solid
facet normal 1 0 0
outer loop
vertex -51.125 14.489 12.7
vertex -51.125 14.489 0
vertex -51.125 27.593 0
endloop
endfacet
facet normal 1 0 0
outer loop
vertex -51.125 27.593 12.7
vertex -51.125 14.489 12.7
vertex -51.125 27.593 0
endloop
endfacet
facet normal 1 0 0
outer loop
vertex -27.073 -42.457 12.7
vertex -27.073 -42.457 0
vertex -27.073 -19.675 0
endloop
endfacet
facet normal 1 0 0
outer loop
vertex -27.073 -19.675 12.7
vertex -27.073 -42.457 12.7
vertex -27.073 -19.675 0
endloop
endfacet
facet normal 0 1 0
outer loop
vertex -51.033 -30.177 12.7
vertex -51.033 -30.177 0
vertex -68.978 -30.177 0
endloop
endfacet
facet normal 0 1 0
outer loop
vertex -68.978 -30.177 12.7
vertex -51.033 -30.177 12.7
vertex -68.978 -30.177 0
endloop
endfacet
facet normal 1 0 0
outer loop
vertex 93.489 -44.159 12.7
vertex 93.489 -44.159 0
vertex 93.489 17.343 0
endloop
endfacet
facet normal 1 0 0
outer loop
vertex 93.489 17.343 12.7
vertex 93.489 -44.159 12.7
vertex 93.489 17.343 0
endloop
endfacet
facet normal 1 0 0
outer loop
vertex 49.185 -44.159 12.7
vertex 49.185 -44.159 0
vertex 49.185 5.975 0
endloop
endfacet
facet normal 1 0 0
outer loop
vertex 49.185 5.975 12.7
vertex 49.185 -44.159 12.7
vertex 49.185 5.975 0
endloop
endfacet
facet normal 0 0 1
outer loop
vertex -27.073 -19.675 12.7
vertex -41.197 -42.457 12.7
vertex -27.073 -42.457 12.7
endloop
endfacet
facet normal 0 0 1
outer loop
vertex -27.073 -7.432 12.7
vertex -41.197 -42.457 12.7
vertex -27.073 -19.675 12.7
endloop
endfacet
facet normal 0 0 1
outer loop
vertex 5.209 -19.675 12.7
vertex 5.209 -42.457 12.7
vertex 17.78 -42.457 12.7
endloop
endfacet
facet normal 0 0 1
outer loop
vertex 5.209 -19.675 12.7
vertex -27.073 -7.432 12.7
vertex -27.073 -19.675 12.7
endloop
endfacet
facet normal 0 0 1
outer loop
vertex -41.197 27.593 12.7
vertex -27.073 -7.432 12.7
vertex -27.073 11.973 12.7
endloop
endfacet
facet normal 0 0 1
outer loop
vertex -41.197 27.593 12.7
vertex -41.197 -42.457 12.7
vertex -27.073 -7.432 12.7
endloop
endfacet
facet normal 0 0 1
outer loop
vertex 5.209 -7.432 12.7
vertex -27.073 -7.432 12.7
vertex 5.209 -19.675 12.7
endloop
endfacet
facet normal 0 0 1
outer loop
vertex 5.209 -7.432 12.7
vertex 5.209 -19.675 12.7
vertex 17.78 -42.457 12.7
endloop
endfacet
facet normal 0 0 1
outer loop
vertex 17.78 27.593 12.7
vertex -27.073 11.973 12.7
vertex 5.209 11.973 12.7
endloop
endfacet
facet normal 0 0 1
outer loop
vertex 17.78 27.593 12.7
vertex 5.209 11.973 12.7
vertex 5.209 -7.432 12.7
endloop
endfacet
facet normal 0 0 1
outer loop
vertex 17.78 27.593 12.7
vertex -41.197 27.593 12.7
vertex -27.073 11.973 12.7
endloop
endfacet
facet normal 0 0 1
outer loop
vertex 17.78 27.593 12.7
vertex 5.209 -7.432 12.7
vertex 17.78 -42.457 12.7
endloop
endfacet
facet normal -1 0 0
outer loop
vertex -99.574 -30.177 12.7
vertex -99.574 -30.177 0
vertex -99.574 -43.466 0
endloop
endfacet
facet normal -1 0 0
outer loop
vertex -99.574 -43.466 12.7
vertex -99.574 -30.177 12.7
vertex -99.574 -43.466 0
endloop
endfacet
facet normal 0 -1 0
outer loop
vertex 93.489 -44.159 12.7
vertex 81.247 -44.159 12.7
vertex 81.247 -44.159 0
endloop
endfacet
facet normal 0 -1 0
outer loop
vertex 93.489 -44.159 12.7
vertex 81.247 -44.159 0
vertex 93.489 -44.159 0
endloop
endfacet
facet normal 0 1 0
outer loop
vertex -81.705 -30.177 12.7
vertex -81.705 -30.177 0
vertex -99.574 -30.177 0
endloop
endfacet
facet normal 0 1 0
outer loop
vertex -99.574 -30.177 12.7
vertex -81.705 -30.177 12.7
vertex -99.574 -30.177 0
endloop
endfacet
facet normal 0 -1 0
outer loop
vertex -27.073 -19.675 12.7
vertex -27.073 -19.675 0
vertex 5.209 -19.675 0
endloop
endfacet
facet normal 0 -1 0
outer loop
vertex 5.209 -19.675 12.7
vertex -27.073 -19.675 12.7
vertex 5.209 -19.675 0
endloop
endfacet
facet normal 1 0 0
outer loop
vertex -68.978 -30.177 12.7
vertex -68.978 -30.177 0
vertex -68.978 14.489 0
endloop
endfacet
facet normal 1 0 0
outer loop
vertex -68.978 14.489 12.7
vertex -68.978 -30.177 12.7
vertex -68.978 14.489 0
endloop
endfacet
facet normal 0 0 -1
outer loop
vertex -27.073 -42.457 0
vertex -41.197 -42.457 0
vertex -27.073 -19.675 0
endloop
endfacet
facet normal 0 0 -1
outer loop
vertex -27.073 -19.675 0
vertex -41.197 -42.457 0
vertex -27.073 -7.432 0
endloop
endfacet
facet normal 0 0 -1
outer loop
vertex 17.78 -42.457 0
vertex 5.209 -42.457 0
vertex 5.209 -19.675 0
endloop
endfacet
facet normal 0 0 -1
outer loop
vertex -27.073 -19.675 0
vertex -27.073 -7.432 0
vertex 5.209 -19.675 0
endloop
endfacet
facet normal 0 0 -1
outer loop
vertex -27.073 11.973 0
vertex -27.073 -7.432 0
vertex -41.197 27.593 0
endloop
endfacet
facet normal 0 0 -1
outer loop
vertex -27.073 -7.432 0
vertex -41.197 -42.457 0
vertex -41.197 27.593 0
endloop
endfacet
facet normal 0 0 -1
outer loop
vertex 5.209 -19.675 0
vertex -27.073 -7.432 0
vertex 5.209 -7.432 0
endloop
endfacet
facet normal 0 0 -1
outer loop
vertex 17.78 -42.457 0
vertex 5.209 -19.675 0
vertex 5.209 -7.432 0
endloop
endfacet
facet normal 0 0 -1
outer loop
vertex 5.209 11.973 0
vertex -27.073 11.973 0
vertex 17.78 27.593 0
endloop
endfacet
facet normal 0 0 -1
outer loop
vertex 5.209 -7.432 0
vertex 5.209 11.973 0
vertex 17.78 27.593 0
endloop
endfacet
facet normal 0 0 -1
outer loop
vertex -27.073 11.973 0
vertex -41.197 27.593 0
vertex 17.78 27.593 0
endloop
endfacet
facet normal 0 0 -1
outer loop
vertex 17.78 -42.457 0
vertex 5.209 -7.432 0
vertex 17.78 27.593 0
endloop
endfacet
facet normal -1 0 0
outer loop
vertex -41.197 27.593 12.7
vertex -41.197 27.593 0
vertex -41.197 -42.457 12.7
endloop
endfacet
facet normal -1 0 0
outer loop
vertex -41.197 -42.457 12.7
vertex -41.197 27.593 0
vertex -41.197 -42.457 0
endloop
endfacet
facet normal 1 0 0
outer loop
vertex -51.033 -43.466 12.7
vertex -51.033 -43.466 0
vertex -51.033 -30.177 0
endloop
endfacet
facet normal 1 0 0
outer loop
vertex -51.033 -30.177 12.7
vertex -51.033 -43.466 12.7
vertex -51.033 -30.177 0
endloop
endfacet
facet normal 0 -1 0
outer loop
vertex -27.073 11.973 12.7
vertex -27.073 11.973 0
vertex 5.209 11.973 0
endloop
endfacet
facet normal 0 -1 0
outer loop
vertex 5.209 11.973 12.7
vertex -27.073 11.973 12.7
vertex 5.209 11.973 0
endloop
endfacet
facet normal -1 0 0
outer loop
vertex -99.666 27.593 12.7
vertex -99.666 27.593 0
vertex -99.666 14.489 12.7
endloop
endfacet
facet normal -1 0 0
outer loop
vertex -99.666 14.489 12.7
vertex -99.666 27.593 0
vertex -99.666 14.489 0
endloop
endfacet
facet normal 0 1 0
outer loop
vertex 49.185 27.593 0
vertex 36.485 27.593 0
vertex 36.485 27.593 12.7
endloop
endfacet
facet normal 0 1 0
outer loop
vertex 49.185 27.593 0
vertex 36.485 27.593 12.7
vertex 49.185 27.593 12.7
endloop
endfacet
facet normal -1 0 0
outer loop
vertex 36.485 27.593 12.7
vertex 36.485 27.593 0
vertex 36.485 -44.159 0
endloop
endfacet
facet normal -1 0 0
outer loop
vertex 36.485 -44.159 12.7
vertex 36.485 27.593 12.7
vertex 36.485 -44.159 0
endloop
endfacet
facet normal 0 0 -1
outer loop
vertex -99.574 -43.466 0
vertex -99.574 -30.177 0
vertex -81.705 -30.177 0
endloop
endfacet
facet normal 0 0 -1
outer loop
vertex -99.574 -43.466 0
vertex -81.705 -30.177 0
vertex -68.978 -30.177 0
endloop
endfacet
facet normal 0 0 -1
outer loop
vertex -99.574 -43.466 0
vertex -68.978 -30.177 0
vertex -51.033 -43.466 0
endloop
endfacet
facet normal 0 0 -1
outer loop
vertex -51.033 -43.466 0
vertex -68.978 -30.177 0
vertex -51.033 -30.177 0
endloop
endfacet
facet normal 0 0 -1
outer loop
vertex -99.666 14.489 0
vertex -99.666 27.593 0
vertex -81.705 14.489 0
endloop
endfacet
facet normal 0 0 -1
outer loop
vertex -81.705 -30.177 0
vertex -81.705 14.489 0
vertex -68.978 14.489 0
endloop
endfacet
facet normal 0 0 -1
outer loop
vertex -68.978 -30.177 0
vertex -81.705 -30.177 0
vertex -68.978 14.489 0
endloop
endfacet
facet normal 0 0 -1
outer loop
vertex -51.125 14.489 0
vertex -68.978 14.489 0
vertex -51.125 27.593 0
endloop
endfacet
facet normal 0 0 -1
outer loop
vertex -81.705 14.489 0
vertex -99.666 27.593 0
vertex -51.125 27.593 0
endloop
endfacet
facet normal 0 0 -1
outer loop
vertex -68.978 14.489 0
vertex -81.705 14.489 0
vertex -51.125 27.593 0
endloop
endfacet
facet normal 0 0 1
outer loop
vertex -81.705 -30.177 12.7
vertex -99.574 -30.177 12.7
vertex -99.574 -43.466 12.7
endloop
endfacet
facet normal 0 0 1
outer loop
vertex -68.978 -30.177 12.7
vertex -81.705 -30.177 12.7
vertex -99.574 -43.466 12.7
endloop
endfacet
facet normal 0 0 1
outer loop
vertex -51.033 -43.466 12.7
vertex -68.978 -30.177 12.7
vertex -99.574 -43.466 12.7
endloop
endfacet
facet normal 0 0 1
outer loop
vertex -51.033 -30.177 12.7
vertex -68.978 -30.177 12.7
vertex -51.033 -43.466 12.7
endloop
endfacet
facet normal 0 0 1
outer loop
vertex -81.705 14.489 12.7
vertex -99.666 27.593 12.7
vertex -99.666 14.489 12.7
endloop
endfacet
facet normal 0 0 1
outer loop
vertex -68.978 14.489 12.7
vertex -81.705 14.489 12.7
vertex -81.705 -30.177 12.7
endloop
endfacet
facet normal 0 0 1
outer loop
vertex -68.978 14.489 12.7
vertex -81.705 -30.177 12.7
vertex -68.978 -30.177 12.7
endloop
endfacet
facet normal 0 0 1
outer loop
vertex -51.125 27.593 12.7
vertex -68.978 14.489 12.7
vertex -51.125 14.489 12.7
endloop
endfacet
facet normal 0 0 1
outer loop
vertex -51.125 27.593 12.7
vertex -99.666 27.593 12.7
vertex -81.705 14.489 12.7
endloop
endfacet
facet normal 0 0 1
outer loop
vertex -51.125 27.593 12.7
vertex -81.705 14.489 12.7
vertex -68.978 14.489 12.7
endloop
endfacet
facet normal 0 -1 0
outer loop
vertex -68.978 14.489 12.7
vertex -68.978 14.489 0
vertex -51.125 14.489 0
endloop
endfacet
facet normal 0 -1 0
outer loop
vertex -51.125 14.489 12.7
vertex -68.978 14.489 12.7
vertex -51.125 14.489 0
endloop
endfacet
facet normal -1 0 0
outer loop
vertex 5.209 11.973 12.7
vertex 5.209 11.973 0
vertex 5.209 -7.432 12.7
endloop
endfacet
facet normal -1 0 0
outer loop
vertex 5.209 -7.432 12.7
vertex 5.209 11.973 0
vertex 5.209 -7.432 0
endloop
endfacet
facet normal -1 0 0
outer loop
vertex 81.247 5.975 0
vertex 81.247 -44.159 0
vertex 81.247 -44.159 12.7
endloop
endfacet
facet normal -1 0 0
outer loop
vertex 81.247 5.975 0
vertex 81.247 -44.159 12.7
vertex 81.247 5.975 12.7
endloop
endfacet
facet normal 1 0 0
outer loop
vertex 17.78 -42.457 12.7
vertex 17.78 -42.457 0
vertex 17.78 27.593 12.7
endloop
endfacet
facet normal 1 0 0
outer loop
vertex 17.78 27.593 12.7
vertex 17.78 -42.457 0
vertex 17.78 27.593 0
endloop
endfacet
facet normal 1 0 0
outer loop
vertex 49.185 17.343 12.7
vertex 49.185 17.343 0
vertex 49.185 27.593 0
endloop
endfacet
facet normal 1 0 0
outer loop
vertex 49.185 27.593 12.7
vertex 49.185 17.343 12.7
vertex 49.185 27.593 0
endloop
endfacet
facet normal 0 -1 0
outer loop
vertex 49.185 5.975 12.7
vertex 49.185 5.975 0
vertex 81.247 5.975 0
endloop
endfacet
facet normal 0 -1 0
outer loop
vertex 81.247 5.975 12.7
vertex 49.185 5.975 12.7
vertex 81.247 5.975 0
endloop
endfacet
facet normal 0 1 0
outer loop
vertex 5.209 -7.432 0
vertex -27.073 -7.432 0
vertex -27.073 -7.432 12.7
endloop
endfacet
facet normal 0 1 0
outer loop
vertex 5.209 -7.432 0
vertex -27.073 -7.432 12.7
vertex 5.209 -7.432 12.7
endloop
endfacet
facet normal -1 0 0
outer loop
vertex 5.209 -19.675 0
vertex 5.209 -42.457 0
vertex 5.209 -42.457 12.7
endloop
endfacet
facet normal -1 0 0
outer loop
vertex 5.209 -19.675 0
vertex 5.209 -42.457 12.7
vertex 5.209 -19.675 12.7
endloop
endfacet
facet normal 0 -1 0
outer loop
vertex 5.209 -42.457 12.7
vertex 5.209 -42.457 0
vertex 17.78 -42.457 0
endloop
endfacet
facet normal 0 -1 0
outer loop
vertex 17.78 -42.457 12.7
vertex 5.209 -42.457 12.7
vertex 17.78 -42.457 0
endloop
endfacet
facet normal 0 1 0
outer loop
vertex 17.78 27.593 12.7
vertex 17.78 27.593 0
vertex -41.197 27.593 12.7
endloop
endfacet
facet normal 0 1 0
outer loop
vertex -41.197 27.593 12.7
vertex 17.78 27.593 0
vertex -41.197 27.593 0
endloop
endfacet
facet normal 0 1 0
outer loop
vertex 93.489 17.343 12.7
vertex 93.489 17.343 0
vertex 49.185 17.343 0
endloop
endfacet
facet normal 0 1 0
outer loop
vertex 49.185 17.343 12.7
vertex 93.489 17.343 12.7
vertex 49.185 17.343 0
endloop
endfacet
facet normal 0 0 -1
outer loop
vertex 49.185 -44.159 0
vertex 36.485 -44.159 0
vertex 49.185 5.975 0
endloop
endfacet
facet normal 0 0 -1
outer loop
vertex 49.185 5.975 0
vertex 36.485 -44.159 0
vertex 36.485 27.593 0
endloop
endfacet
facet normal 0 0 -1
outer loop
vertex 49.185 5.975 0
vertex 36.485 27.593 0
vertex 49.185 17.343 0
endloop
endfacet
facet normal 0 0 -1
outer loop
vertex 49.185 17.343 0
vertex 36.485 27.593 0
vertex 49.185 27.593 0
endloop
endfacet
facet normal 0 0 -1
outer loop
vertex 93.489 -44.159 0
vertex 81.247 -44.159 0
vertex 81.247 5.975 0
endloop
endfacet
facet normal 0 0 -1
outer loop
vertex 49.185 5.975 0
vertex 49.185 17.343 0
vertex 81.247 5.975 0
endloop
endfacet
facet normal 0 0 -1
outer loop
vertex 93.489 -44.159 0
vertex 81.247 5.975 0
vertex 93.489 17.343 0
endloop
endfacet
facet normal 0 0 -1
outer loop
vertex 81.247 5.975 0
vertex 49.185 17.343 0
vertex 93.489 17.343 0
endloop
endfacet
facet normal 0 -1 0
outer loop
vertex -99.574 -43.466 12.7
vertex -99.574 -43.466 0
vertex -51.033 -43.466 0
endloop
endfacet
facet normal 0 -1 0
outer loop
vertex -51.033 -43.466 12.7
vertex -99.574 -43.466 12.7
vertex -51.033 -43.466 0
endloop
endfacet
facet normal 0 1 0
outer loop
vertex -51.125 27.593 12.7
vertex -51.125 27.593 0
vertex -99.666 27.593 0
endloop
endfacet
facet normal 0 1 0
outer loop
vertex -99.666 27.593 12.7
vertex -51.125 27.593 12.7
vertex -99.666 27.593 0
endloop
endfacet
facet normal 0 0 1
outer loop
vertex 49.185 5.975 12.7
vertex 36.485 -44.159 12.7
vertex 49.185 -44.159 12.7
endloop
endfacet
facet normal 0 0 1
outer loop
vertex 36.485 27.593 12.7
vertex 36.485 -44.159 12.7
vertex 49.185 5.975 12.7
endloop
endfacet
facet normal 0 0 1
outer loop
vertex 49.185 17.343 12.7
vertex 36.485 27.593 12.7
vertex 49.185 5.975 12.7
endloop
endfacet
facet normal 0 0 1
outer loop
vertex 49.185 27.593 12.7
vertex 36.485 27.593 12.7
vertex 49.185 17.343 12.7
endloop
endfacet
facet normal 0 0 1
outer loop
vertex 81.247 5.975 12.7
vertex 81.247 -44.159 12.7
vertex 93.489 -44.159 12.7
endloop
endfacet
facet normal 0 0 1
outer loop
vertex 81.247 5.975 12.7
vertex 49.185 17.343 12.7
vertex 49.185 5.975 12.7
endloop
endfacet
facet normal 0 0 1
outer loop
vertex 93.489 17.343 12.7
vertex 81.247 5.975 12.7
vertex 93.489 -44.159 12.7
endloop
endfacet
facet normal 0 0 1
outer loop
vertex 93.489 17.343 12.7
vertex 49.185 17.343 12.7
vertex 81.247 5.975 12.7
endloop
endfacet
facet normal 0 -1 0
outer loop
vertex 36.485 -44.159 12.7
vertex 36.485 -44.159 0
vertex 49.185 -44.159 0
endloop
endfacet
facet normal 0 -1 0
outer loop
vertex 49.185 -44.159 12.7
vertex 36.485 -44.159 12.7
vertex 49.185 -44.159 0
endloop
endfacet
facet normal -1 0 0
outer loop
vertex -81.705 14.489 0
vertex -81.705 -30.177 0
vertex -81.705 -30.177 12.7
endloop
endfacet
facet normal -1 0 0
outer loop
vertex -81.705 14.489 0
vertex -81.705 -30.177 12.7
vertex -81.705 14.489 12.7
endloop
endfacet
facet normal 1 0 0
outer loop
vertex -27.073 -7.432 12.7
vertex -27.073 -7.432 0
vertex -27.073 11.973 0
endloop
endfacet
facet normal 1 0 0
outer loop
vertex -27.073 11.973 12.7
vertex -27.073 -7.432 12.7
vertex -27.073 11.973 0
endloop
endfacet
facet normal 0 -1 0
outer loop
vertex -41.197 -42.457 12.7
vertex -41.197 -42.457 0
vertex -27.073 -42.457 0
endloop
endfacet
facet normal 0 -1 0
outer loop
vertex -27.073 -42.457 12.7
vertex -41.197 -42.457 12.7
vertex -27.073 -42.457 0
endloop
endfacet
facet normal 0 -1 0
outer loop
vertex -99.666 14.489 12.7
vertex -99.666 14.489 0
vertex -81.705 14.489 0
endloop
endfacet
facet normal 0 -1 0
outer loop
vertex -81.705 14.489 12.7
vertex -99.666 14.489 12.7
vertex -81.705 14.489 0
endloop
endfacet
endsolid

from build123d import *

# Parameters (mm, degrees)
F0_W     = 12.7005800605
F0_H     = 10.2500505745
F0_H_2   = 11.3675412722
F0_H_3   = 50.1337680034
F0_W_2   = 12.241974473
F1_DEPTH = 12.7
F0_W_3   = 14.1233932227
F0_H_4   = 12.2422706336
F0_W_4   = 12.5713734888
F0_H_5   = 22.7828882635
F0_W_5   = 32.2820437141
F0_W_6   = 12.7265676856
F0_H_6   = 44.66532683


with BuildPart() as f1:
    # F0 (on Top) → F1 (new body)
    with BuildSketch(Plane.XY):
        with Locations((42.8348556161, 22.4678125232)):
            Rectangle(F0_W, F0_H)
        with Locations((42.8348556161, 11.6590165999)):
            Rectangle(F0_W, F0_H_2)
        Polygon((93.489408493, 17.342787236), (49.1851456463, 17.342787236), (49.1851456463, 5.9752459638), (81.24743402, 5.9752459638), (93.489408493, 5.9752459638), align=None)
        with Locations((42.8348556161, -19.0916380379)):
            Rectangle(F0_W, F0_H_3)
        with Locations((87.3684212565, -19.0916380379)):
            Rectangle(F0_W_2, F0_H_3)
    extrude(amount=F1_DEPTH)


with BuildPart() as f1b:
    # F0 (on Top) → F1, piece 2 (new body)
    with BuildSketch(Plane.XY):
        Polygon((17.7800580859, 27.5928378105), (-41.1967523396, 27.5928378105), (-41.1967523396, -7.4323210865), (-27.0733591169, -7.4323210865), (-27.0733591169, 11.9729917496), (5.2086845972, 11.9729917496), (5.2086845972, -7.4323210865), (17.7800580859, -7.4323210865), align=None)
        with Locations((-34.1350557283, -13.5534564033)):
            Rectangle(F0_W_3, F0_H_4)
        with Locations((11.4943713415, -13.5534564033)):
            Rectangle(F0_W_4, F0_H_4)
        with Locations((-34.1350557283, -31.0660358518)):
            Rectangle(F0_W_3, F0_H_5)
        with Locations((-10.9323372599, -13.5534564033)):
            Rectangle(F0_W_5, F0_H_4)
        with Locations((11.4943713415, -31.0660358518)):
            Rectangle(F0_W_4, F0_H_5)
    extrude(amount=F1_DEPTH)


with BuildPart() as f1c:
    # F0 (on Top) → F1, piece 3 (new body)
    with BuildSketch(Plane.XY):
        Polygon((-51.1251911521, 27.5928378105), (-99.6664389968, 27.5928378105), (-99.6664389968, 14.4885461777), (-81.7045047879, 14.4885461777), (-68.9779371023, 14.4885461777), (-51.1251911521, 14.4885461777), align=None)
        with Locations((-75.3412209451, -7.8441172373)):
            Rectangle(F0_W_6, F0_H_6)
        Polygon((-68.9779371023, -30.1767806523), (-81.7045047879, -30.1767806523), (-99.5741523802, -30.1767806523), (-99.5741523802, -43.4656389989), (-51.0329045355, -43.4656389989), (-51.0329045355, -30.1767806523), align=None)
    extrude(amount=F1_DEPTH)


solid = Compound([f1.part, f1b.part, f1c.part])
